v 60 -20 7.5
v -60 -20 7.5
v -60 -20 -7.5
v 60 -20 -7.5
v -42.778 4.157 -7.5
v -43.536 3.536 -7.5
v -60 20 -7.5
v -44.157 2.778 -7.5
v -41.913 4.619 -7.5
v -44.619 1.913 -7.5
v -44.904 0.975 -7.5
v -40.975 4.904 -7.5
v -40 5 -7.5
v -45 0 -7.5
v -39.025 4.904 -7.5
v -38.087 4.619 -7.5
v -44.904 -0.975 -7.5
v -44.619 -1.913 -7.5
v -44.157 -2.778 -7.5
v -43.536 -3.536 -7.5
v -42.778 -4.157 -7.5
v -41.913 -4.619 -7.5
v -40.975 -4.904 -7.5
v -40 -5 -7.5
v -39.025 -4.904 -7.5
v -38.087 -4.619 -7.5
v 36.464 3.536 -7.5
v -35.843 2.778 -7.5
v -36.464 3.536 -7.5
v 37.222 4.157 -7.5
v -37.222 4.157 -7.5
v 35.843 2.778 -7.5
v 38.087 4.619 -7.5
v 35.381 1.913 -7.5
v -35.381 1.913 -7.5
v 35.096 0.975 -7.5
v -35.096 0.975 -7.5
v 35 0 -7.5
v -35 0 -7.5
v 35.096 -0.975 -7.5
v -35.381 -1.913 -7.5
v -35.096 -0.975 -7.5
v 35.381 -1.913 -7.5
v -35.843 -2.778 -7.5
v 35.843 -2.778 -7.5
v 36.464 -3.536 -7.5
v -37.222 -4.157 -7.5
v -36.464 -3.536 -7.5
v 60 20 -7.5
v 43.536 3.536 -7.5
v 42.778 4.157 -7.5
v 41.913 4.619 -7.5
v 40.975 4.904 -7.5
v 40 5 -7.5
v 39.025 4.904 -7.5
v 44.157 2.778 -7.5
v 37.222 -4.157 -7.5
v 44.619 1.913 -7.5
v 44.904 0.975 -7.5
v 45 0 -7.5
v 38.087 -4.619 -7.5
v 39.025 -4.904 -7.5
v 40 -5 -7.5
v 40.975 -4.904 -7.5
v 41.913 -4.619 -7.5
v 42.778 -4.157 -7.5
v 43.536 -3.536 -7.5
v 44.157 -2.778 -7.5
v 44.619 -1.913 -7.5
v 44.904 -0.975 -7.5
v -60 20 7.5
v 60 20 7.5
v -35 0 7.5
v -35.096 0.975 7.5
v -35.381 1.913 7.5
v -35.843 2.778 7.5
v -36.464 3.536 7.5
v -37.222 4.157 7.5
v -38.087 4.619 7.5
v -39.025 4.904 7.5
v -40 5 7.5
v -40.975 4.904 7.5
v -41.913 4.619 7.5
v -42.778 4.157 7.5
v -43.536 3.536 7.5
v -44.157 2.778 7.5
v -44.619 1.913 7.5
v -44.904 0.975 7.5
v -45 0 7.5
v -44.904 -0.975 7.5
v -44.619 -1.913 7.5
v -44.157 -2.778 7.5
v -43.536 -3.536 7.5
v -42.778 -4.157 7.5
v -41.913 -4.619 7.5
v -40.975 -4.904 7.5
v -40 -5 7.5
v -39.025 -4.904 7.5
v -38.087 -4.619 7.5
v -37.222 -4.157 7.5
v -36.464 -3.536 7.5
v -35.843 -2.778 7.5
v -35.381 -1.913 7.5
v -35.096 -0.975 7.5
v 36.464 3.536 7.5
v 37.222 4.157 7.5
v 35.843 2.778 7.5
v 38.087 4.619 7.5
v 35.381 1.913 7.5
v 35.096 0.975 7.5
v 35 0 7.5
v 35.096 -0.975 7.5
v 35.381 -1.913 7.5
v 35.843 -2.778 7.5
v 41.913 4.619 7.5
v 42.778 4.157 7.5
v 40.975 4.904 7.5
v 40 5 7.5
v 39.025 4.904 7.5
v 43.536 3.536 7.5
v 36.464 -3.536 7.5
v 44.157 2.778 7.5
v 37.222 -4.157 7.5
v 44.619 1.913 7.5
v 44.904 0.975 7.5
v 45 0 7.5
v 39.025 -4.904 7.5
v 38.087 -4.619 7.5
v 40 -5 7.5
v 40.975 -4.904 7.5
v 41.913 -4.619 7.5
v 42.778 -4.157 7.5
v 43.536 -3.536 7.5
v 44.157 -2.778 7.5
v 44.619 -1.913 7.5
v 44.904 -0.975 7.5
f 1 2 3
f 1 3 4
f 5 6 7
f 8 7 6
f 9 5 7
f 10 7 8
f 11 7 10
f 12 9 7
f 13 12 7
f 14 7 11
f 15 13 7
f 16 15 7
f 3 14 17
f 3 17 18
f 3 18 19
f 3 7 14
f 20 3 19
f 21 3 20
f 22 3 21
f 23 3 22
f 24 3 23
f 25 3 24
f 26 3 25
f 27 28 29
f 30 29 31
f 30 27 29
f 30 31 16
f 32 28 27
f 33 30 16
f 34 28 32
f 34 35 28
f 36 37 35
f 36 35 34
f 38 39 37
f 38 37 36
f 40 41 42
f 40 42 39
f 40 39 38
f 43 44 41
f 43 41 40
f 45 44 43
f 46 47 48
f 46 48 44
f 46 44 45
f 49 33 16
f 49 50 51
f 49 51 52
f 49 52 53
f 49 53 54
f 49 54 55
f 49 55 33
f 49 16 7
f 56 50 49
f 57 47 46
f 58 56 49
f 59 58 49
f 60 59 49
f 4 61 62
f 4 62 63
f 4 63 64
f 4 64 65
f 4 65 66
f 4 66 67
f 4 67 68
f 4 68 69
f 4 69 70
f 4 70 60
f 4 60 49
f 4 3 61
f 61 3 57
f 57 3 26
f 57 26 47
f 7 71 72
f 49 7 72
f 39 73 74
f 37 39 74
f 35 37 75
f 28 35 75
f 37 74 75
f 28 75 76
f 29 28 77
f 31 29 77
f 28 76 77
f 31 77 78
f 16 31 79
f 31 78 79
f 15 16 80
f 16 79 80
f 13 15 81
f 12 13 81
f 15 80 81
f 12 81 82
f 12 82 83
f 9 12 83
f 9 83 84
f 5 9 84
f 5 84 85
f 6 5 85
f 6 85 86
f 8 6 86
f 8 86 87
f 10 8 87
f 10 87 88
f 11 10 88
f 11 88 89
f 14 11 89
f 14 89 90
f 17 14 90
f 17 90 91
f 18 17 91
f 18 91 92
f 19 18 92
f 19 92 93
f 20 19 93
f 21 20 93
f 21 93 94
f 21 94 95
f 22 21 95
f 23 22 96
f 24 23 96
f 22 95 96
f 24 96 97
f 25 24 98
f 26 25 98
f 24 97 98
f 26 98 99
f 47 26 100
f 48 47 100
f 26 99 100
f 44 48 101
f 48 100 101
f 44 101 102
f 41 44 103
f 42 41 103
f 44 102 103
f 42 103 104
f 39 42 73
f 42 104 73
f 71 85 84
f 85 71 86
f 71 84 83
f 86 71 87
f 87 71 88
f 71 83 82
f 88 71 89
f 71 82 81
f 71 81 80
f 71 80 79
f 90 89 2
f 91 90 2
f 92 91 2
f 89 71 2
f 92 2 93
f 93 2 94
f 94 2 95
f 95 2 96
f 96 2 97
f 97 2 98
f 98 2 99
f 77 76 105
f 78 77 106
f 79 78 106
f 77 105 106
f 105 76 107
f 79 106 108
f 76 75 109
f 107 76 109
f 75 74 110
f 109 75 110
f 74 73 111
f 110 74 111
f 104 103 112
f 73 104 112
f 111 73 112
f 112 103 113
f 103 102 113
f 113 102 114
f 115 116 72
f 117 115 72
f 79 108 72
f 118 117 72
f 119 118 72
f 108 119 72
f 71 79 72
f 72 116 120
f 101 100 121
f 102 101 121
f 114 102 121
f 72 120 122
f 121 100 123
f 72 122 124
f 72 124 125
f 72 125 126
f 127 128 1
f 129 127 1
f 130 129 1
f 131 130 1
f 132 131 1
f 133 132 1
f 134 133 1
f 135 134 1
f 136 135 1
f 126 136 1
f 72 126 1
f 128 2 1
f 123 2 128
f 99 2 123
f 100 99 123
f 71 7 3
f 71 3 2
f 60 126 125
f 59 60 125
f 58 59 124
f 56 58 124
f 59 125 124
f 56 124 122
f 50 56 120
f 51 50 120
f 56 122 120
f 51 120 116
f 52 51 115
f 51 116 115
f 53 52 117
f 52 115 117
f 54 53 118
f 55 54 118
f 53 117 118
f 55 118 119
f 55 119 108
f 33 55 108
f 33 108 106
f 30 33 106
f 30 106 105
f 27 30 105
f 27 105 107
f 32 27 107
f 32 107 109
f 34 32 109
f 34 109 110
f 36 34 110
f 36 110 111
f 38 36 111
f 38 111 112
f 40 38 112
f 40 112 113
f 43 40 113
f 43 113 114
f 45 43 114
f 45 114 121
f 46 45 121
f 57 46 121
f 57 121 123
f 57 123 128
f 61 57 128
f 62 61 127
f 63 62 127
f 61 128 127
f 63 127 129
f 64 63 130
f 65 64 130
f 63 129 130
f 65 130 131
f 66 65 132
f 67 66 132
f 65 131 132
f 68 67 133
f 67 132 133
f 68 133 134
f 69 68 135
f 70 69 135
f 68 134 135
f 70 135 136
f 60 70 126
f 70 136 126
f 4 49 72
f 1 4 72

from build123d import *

# Parameters (mm, degrees)
F0_W     = 120
F0_H     = 15
F1_DEPTH = 20
F2_R     = 5
F3_DEPTH = 15.001


with BuildPart() as f1:
    # F0 (on Front) → F1 (new body, symmetric)
    with BuildSketch(Plane.XZ):
        Rectangle(F0_W, F0_H)
    extrude(amount=F1_DEPTH, both=True)

    # F2 (on face) → F3 (cut, through all)
    with BuildSketch(Plane.XY.offset(7.5)):
        with Locations((-40, 0)):
            Circle(F2_R)
        with Locations((40, 0)):
            Circle(F2_R)
    extrude(amount=-F3_DEPTH, mode=Mode.SUBTRACT)


solid = f1.part
